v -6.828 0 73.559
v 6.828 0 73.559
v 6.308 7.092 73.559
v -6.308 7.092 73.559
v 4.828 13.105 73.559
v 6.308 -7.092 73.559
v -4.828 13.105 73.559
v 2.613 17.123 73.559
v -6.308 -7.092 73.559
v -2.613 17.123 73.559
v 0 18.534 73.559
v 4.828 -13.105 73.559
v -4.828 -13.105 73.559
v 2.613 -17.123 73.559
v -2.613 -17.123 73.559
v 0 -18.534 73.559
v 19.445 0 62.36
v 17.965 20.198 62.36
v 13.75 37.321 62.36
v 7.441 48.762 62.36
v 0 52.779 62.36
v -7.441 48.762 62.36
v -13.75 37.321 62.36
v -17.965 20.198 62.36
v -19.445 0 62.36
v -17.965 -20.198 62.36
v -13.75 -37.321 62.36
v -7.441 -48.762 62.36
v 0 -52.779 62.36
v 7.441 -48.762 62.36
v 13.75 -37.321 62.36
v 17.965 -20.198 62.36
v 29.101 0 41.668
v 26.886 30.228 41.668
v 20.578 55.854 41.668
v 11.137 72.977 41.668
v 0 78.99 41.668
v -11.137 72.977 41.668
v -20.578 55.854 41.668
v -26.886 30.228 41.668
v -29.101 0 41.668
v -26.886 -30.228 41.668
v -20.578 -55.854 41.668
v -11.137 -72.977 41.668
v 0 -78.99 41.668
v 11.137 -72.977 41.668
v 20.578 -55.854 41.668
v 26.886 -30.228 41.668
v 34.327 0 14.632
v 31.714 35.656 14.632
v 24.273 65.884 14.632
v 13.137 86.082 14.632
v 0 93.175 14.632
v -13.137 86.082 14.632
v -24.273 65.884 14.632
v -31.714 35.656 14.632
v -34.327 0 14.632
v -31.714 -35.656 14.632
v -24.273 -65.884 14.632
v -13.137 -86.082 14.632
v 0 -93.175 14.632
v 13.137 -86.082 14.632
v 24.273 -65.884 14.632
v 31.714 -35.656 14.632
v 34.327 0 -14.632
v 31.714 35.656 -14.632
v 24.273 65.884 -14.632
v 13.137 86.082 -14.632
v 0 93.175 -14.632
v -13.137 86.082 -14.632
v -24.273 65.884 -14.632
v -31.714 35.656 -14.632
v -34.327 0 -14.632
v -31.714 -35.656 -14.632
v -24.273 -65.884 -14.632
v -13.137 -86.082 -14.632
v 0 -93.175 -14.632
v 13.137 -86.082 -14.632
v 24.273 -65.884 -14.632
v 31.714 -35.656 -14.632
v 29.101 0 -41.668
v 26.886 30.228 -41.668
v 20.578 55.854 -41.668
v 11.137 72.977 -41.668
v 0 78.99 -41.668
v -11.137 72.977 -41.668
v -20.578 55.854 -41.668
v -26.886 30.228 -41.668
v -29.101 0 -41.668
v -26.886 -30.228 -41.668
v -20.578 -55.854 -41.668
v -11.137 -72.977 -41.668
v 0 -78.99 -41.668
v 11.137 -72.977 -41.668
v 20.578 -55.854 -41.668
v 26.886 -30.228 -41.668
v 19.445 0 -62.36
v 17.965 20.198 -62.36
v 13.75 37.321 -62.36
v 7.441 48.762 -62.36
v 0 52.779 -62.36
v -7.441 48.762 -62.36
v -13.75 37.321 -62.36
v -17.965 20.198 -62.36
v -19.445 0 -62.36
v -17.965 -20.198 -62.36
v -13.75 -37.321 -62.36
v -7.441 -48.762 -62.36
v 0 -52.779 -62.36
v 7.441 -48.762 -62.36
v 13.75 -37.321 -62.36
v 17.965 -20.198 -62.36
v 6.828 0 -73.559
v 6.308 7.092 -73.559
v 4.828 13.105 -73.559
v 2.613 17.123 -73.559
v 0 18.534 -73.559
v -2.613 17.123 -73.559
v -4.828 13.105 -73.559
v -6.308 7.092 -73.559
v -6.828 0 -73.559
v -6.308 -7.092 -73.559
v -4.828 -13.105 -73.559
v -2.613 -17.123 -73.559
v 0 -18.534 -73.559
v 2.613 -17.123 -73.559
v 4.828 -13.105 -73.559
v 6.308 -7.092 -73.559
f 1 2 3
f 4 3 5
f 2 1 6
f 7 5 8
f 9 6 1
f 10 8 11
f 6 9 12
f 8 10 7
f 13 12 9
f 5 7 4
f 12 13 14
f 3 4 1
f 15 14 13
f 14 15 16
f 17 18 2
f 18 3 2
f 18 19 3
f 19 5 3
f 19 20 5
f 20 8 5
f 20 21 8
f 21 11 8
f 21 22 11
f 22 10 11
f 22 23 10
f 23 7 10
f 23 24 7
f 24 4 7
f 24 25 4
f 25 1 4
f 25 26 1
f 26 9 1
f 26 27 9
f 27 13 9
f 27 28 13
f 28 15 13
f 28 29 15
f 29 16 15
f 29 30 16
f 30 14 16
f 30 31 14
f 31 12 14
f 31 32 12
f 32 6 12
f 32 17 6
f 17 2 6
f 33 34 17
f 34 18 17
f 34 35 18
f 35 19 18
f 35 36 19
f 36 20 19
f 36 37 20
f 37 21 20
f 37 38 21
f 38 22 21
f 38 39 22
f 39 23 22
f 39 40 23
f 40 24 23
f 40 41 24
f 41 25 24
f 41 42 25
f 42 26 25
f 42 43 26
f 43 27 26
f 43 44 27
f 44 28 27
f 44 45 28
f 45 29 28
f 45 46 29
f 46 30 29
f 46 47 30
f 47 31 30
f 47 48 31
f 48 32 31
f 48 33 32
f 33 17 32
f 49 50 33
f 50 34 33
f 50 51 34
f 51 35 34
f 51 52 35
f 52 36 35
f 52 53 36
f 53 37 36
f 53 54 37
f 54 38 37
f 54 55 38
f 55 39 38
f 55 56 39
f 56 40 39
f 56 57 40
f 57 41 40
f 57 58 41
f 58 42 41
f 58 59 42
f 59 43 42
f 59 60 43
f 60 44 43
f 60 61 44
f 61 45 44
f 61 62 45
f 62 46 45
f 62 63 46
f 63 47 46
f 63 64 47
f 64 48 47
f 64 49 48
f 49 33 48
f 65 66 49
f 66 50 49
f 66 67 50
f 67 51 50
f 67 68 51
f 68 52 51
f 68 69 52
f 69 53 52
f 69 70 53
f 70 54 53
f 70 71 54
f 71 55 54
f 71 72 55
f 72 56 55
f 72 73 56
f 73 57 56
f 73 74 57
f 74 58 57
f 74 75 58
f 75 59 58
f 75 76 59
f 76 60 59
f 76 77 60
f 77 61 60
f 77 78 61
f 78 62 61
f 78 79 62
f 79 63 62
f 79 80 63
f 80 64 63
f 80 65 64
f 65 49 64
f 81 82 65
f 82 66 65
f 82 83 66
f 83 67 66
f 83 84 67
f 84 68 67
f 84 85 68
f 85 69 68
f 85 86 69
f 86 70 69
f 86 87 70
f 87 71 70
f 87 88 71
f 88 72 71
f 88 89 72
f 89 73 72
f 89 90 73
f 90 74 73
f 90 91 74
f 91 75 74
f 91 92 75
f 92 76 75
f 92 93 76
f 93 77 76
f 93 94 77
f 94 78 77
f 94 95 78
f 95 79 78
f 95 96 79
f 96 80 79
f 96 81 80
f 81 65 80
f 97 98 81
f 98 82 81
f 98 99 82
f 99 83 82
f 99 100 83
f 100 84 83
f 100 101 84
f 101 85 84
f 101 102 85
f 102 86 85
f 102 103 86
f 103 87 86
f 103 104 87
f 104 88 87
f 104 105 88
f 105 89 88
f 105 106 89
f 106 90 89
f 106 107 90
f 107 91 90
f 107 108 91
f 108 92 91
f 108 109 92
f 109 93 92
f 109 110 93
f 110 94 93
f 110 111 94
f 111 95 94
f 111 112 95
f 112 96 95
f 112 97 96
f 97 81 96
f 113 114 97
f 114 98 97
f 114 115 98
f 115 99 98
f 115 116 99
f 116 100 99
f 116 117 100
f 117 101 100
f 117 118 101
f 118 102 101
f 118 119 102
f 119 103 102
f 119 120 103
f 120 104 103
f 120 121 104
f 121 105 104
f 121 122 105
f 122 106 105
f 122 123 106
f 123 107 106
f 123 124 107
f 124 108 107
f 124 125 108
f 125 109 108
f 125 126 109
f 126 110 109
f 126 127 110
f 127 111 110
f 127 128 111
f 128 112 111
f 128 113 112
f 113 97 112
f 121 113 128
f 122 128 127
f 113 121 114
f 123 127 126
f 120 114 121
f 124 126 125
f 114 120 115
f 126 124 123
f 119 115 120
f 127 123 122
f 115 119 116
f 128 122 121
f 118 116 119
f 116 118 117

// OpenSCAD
// Generated by SolidPython 1.0.1 on 2020-07-29 00:46:48


scale(v = [7, 19, 15]) {
	sphere(r = 5);
}
/***********************************************
*********      SolidPython code:      **********
************************************************
 
# import packages: SolidPython
from solid import *
from solid.utils import *
from itertools import chain, combinations, permutations


class Resize:

    def __init__(self, scad_file):
        self.scad_file = scad_file
        #self.scad_file = import_scad(scad_file)
        # cone/cylinder param:
        self.r1 = 0
        self.r2 = 0
        self.h = 0
        # rectangular prism param:
        self.w = 0
        self.l = 0
        # ellipse param:
        self.r = 0

    # import OpenScad code (file name corresponds to shape)


    # classify shape + parameters
    def assign(self, param1, param2, param3):
        if self.scad_file == 'cone.scad':
            self.r1 = param1
            self.r2 = param2
            self.h = param3
        elif self.scad_file == 'cylinder.scad':
            self.r1 = param1
            self.r2 = param2
            self.h = param3
        elif self.scad_file == 'rectangularPrism.scad':
            self.h = param1
            self.l = param2
            self.w = param3
        else:
            self.r = param1
            self.h = param2

    # resize parameters
    def iterate(self):
        x = range(3, 20, 2)
        i = 1
        if self.scad_file == 'cone.scad':
            tempList = list(permutations(x, 2))
            for temp in tempList:
                param1 = temp[0]
                param2 = temp[1]
                filepath = 'produced_scad_files/' + 'cone' + str(param1) + '_' + str(param2) + '_' + '.scad'
                scad_render_to_file(cylinder(h=param1, r1=param2, r2=0), filepath)

        elif self.scad_file == 'cylinder.scad':
            tempList = list(permutations(x, 3))
            for temp in tempList:
                param1 = temp[0]
                param2 = temp[1]
                filepath = 'produced_scad_files/' + 'cylinder' + str(param1) + '_' + str(param2) + '_' + '.scad'
                scad_render_to_file(cylinder(h=param1, r1=param2, r2=param2), filepath)

        elif self.scad_file == 'rectangularPrism.scad':
            tempList = list(permutations(x, 3))
            for temp in tempList:
                param1 = temp[0]
                param2 = temp[1]
                param3 = temp[2]
                filepath = 'produced_scad_files/' + 'rectangularPrism' + str(param1) + '_' + str(param2) + '_' + str(
                    param3) + '.scad'
                scad_render_to_file(cube(size=(param1, param2, param3)), filepath)

        elif self.scad_file == 'ellipse.scad':
            tempList = list(permutations(x, 4))
            for temp in tempList:
                param1 = temp[0]
                param2 = temp[1]
                param3 = temp[2]
                param4 = temp[3]
                filepath = 'produced_scad_files/' + 'ellipse' + str(param1) + '_' + str(param2) + '_' + str(param3) + '_' + str(param4) + '.scad'
                scad_render_to_file(scale([param1, param2, param3])(sphere(r=param4)), filepath)

    def render_to_scadfile(self):
        scad_render_to_file(scad, 'example.scad') 
 
************************************************/
